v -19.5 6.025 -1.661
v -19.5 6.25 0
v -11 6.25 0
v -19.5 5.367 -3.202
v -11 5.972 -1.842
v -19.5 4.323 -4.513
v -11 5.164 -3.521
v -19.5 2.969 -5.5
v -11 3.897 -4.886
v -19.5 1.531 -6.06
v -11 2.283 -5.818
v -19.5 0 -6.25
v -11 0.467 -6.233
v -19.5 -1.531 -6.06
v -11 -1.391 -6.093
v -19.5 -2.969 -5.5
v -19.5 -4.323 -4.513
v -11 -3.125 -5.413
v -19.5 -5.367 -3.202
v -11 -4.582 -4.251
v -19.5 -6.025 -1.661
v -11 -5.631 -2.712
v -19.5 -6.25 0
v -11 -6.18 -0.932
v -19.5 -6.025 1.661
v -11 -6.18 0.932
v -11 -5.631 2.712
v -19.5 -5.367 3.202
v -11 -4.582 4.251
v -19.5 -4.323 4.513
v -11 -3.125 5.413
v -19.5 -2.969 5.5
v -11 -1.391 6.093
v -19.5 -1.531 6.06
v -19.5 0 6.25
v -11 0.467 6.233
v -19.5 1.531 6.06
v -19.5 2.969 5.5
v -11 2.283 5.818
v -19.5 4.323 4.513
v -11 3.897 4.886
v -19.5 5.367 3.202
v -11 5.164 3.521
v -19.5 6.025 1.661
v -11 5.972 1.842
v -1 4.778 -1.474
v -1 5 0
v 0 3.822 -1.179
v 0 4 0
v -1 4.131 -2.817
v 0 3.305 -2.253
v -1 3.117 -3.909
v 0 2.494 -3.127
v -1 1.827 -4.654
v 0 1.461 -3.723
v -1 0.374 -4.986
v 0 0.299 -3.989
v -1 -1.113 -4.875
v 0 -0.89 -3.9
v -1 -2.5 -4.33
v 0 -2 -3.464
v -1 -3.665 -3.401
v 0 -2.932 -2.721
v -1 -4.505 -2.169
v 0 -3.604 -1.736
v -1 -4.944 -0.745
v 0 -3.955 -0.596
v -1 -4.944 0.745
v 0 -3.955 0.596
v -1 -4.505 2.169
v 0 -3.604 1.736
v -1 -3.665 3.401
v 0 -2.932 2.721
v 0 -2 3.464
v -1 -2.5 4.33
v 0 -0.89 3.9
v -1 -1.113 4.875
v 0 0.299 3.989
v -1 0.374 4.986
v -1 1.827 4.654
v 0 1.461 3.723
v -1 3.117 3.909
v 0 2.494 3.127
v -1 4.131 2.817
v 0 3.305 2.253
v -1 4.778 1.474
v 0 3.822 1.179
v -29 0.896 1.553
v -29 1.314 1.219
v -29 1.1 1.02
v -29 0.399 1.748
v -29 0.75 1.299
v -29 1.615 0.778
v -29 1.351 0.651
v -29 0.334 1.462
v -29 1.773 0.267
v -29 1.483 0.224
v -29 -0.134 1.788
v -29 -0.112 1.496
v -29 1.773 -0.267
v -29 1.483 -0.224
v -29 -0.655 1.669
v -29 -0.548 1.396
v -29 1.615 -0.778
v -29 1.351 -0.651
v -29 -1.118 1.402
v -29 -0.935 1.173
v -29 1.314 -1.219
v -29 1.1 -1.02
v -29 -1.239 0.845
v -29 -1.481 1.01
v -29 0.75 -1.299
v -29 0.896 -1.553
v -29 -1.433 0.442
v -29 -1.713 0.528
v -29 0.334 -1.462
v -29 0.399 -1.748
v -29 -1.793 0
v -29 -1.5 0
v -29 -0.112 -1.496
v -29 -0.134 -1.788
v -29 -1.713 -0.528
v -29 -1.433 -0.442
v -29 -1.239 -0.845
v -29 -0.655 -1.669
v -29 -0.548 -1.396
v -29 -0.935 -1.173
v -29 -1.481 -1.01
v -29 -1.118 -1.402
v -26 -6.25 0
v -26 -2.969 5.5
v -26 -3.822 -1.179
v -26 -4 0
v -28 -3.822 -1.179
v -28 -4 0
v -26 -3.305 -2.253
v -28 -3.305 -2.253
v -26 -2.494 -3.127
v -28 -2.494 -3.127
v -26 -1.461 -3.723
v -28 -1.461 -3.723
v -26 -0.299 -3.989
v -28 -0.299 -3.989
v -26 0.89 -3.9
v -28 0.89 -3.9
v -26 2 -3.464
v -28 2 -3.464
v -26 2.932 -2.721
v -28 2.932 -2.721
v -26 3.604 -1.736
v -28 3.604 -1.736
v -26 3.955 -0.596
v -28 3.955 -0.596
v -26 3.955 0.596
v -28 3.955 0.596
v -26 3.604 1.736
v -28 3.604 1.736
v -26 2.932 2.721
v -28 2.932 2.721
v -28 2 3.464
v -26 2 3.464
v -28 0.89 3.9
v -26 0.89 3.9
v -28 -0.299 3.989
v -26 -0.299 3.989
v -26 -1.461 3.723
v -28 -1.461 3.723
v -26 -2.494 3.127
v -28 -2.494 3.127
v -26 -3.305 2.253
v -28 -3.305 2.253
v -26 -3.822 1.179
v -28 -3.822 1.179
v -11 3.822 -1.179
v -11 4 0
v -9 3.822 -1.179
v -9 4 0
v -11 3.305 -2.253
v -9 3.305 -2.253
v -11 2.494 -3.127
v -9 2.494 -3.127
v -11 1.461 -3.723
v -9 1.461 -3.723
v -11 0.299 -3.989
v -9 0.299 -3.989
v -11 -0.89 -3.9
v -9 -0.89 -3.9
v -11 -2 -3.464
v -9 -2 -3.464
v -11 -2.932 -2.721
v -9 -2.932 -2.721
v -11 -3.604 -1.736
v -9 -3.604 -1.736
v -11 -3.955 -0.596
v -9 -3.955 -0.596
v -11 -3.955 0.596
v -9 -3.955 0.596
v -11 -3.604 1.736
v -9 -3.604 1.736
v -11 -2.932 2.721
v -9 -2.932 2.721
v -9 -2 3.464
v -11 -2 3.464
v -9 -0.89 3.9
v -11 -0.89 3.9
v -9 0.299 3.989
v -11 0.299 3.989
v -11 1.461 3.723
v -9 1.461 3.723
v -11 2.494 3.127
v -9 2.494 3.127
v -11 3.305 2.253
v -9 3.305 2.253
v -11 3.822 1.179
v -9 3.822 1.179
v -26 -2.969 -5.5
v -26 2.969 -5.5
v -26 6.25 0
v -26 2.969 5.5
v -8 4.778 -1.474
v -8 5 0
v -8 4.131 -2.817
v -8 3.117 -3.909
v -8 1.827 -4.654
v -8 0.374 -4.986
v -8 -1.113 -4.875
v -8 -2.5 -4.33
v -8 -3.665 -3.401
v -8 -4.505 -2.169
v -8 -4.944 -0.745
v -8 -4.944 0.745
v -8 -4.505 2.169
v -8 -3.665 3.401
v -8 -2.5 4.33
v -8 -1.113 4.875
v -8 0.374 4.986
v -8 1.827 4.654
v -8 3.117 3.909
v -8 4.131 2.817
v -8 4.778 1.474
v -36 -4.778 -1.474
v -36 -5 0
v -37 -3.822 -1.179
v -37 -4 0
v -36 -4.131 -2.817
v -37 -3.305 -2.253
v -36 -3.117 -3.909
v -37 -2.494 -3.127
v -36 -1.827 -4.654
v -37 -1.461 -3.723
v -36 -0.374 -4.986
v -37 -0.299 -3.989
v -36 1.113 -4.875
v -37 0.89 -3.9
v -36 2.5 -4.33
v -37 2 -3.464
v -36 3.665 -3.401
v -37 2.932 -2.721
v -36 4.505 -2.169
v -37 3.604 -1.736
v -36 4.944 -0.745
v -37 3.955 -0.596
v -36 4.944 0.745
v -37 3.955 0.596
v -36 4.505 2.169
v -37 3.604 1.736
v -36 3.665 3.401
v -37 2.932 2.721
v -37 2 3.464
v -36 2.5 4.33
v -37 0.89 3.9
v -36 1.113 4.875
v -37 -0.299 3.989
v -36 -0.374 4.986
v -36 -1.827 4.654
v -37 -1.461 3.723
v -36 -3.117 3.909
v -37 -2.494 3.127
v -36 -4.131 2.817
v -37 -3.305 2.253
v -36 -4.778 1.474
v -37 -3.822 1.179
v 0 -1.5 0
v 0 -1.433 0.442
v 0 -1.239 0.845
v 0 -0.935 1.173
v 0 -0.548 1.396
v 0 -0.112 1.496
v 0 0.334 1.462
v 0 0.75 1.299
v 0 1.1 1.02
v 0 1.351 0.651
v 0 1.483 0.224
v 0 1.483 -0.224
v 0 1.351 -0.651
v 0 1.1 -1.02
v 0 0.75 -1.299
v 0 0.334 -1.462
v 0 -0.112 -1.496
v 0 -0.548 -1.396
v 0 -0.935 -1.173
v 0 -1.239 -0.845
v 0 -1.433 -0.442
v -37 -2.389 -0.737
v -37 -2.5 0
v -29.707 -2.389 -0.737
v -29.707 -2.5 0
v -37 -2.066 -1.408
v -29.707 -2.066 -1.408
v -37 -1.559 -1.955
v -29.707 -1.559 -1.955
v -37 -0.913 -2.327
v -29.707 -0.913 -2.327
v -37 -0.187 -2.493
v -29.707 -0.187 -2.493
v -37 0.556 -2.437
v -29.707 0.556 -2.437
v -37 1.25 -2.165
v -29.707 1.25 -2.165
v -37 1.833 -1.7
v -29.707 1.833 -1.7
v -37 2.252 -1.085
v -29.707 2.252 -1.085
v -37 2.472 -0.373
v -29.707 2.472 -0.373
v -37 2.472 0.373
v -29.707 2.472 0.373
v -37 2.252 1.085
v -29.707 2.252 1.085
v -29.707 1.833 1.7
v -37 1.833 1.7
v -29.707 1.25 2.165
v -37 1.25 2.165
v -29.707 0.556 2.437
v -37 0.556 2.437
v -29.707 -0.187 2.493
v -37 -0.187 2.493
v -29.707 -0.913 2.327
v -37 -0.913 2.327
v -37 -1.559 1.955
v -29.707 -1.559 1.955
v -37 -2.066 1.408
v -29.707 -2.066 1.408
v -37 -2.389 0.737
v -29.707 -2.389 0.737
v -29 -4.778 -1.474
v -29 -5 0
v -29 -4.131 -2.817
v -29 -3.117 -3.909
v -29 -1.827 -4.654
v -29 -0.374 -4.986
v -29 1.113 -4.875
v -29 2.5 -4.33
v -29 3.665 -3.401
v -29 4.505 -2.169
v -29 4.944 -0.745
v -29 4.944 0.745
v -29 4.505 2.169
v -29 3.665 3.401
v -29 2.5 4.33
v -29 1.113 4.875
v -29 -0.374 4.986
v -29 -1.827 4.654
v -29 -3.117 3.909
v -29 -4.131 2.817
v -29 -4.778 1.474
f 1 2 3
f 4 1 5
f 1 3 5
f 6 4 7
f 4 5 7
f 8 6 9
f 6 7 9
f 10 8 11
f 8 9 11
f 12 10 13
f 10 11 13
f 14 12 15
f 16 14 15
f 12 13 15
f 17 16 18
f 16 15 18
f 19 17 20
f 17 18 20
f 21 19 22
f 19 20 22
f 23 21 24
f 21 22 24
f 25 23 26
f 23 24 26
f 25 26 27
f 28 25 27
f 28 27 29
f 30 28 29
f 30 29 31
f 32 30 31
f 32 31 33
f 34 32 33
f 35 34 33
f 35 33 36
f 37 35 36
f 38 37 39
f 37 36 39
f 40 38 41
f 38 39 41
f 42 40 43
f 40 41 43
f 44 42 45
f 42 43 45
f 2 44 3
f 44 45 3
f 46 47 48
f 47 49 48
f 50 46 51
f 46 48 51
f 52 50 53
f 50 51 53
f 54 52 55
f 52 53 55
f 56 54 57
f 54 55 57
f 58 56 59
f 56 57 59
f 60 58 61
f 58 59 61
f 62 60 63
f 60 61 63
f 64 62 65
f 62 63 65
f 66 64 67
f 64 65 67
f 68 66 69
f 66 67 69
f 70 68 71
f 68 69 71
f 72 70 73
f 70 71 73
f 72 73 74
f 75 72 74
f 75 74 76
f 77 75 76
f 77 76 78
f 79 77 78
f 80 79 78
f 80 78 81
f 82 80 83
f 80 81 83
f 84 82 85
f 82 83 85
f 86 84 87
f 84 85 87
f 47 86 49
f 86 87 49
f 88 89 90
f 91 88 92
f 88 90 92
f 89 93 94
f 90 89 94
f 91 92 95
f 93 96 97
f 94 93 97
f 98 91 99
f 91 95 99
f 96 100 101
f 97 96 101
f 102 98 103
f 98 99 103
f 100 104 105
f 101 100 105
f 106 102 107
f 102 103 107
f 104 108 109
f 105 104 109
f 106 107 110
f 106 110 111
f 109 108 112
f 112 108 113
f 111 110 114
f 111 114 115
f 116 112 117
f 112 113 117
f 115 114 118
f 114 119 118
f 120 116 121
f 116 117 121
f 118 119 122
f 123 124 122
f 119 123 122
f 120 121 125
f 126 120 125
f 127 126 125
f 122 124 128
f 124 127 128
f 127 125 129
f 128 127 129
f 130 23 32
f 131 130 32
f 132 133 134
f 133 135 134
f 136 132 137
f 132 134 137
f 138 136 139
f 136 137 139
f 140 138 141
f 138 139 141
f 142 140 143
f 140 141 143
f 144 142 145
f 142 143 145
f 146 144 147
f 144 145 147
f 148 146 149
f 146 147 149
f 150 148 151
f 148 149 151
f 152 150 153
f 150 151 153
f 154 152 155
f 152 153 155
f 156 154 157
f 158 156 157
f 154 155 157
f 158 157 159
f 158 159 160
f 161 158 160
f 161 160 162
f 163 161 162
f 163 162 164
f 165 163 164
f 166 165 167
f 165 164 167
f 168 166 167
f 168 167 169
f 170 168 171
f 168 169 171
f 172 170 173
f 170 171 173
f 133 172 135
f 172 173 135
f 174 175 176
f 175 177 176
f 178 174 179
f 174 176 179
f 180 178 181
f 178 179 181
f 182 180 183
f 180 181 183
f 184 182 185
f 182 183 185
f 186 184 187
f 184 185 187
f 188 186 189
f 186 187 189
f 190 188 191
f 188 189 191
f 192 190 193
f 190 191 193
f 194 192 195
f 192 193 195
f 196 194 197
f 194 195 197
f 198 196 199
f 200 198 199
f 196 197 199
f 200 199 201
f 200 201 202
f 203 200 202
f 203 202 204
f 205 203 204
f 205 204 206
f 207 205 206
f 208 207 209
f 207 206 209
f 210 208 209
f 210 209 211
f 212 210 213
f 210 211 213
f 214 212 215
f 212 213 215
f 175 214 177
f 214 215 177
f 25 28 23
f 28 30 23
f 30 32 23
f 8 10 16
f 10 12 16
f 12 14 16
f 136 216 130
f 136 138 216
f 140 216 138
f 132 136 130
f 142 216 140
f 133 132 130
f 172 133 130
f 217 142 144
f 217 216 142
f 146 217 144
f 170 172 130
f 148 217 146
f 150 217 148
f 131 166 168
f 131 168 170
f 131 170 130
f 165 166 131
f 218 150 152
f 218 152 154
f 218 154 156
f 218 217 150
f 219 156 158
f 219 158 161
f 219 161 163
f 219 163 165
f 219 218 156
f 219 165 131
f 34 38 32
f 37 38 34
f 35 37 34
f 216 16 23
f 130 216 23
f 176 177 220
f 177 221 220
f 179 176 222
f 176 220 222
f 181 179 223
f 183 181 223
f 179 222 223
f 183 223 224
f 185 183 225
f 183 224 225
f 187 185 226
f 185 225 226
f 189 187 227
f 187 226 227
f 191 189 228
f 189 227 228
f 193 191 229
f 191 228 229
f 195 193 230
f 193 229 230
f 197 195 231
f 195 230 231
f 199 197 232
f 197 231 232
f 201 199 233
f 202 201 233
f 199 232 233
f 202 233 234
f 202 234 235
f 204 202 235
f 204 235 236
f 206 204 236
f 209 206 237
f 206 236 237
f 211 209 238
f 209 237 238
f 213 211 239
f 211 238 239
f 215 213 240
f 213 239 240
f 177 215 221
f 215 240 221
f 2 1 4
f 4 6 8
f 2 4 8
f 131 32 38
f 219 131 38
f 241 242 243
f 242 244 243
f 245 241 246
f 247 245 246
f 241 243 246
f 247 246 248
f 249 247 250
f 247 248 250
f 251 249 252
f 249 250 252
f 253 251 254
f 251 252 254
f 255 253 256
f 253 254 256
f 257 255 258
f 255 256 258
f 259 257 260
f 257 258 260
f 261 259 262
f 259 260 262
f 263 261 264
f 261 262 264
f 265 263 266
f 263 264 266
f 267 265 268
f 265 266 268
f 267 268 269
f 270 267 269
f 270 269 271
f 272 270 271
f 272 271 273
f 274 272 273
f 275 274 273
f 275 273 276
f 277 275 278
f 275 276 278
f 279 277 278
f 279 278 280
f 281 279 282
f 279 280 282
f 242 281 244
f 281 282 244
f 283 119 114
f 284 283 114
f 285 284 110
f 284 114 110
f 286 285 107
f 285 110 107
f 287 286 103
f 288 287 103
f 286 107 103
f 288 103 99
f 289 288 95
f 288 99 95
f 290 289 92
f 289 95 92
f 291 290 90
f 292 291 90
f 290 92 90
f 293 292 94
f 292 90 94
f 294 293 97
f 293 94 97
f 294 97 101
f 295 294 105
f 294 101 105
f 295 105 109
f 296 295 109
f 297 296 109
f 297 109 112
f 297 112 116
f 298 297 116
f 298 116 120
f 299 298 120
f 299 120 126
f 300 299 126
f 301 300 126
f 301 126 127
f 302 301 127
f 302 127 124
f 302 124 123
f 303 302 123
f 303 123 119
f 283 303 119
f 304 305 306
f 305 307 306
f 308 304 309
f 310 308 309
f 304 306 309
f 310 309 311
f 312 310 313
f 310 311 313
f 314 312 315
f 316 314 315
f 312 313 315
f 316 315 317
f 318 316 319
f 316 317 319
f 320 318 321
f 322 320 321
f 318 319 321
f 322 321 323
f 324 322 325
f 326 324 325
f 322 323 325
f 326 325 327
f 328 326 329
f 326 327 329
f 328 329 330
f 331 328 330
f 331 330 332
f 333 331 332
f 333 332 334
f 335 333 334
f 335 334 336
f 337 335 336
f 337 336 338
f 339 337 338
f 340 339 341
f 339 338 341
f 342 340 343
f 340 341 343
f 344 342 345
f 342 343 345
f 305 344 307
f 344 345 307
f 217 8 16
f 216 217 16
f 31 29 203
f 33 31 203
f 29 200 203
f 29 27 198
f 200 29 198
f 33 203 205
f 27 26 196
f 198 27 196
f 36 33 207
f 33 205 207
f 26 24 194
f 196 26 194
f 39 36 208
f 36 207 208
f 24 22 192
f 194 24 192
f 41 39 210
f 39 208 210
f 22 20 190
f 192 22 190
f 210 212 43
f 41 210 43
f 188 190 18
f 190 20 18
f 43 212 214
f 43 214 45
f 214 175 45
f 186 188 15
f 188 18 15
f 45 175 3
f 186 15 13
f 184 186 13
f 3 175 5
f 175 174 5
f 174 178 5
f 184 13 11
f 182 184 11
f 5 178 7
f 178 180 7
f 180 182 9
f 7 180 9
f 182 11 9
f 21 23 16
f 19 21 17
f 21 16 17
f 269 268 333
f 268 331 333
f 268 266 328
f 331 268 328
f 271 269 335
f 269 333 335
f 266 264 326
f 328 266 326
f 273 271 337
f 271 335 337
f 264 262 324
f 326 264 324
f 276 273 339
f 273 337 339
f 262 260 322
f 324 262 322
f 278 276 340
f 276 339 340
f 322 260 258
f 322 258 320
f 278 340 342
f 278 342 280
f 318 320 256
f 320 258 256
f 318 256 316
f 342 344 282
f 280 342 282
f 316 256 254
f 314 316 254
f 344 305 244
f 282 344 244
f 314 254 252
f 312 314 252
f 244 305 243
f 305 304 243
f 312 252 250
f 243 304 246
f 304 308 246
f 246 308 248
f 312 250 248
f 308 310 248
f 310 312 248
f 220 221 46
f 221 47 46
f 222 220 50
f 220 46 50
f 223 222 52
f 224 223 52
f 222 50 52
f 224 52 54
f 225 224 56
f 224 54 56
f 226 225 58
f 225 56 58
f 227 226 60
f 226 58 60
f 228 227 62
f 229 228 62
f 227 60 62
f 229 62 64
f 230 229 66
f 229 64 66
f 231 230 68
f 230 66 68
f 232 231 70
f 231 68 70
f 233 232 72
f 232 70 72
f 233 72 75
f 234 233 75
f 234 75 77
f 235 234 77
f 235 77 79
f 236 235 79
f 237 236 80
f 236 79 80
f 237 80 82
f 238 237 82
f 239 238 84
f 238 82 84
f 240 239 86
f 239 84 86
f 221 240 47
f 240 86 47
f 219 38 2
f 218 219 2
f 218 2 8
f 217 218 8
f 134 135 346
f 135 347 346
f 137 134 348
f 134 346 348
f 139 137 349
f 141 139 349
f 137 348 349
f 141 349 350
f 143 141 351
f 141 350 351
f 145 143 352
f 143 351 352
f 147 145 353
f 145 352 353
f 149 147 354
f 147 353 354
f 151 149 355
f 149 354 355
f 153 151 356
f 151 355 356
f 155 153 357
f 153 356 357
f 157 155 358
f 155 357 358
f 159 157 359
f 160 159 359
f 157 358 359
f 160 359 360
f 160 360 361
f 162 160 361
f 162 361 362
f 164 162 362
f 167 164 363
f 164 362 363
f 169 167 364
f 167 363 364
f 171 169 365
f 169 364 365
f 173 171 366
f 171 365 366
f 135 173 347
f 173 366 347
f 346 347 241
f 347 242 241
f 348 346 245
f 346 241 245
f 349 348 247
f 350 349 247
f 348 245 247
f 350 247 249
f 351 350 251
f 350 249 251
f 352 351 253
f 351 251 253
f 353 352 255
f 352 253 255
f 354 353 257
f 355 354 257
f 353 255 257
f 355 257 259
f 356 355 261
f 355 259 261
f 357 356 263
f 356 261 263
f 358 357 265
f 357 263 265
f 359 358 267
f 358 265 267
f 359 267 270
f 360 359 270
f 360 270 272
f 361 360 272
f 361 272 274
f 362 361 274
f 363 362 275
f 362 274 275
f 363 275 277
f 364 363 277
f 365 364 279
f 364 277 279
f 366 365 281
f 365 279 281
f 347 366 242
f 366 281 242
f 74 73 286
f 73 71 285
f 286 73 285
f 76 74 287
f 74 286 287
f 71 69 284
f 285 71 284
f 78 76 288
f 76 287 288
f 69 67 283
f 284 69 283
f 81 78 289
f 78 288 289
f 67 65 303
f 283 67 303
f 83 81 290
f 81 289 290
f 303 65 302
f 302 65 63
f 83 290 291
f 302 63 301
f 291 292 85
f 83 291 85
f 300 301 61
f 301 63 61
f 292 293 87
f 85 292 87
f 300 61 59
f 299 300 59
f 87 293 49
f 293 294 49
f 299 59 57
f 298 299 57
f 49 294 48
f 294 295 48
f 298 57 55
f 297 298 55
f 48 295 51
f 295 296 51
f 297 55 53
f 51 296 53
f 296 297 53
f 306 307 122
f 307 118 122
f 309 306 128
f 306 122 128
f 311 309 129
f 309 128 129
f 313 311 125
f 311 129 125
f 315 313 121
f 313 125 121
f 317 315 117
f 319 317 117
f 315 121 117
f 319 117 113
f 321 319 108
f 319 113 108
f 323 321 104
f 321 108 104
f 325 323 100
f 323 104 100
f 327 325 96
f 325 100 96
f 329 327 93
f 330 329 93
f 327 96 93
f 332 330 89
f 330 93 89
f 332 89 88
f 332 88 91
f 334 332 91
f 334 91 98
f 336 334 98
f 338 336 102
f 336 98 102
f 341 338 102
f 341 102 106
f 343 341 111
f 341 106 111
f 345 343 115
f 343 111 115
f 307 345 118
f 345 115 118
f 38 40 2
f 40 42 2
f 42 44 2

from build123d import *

# Parameters (mm, degrees)
RESSALTO_EXTRUS_O1_DEPTH = 6.5
ESBO_O4_R                = 1.5
CORTE_EXTRUS_O1_DEPTH    = 31.317074397


with BuildPart() as part:
    # Esboço1 → Revolução1 (revolve)
    with BuildSketch(Plane.XY):
        Polygon((0, 0), (-19.5, 0), (-19.5, 6.25), (-11, 6.25), (-11, 4), (-9, 4), (-8, 5), (-1, 5), (0, 4), align=None)
    revolve(axis=Axis((0, 0, 0), (-1, 0, 0)))

    # Esboço2 → Ressalto-extrusão1 (add)
    with BuildSketch(Plane.ZY.offset(19.5)):
        Polygon((-5.5, 2.968585522), (-5.5, -2.968585522), (0, -6.25), (5.5, -2.968585522), (5.5, 2.968585522), (0, 6.25), align=None)
    extrude(amount=RESSALTO_EXTRUS_O1_DEPTH)

    # Esboço3 → Revolução2 (revolve)
    with BuildSketch(Plane.XY, mode=Mode.PRIVATE) as revolu_o2_sk:
        Polygon((-29, 0), (-26, 0), (-26, 4), (-28, 4), (-29, 5), (-36, 5), (-37, 4), (-37, 2.5), (-29.707106781, 2.5), (-29, 1.792893219), align=None)
    revolve(revolu_o2_sk.sketch.rotate(Axis((-29, 0, 0), (1, 0, 0)), 180), axis=Axis((-29, 0, 0), (1, 0, 0)))

    # Esboço4 → Corte-extrusão1 (cut, through all)
    with BuildSketch(Plane.ZY.offset(29)):
        with Locations(Location((0, 0, 0), (0, 0, 270))):
            Circle(ESBO_O4_R)
    extrude(amount=-CORTE_EXTRUS_O1_DEPTH, mode=Mode.SUBTRACT)


solid = part.part
